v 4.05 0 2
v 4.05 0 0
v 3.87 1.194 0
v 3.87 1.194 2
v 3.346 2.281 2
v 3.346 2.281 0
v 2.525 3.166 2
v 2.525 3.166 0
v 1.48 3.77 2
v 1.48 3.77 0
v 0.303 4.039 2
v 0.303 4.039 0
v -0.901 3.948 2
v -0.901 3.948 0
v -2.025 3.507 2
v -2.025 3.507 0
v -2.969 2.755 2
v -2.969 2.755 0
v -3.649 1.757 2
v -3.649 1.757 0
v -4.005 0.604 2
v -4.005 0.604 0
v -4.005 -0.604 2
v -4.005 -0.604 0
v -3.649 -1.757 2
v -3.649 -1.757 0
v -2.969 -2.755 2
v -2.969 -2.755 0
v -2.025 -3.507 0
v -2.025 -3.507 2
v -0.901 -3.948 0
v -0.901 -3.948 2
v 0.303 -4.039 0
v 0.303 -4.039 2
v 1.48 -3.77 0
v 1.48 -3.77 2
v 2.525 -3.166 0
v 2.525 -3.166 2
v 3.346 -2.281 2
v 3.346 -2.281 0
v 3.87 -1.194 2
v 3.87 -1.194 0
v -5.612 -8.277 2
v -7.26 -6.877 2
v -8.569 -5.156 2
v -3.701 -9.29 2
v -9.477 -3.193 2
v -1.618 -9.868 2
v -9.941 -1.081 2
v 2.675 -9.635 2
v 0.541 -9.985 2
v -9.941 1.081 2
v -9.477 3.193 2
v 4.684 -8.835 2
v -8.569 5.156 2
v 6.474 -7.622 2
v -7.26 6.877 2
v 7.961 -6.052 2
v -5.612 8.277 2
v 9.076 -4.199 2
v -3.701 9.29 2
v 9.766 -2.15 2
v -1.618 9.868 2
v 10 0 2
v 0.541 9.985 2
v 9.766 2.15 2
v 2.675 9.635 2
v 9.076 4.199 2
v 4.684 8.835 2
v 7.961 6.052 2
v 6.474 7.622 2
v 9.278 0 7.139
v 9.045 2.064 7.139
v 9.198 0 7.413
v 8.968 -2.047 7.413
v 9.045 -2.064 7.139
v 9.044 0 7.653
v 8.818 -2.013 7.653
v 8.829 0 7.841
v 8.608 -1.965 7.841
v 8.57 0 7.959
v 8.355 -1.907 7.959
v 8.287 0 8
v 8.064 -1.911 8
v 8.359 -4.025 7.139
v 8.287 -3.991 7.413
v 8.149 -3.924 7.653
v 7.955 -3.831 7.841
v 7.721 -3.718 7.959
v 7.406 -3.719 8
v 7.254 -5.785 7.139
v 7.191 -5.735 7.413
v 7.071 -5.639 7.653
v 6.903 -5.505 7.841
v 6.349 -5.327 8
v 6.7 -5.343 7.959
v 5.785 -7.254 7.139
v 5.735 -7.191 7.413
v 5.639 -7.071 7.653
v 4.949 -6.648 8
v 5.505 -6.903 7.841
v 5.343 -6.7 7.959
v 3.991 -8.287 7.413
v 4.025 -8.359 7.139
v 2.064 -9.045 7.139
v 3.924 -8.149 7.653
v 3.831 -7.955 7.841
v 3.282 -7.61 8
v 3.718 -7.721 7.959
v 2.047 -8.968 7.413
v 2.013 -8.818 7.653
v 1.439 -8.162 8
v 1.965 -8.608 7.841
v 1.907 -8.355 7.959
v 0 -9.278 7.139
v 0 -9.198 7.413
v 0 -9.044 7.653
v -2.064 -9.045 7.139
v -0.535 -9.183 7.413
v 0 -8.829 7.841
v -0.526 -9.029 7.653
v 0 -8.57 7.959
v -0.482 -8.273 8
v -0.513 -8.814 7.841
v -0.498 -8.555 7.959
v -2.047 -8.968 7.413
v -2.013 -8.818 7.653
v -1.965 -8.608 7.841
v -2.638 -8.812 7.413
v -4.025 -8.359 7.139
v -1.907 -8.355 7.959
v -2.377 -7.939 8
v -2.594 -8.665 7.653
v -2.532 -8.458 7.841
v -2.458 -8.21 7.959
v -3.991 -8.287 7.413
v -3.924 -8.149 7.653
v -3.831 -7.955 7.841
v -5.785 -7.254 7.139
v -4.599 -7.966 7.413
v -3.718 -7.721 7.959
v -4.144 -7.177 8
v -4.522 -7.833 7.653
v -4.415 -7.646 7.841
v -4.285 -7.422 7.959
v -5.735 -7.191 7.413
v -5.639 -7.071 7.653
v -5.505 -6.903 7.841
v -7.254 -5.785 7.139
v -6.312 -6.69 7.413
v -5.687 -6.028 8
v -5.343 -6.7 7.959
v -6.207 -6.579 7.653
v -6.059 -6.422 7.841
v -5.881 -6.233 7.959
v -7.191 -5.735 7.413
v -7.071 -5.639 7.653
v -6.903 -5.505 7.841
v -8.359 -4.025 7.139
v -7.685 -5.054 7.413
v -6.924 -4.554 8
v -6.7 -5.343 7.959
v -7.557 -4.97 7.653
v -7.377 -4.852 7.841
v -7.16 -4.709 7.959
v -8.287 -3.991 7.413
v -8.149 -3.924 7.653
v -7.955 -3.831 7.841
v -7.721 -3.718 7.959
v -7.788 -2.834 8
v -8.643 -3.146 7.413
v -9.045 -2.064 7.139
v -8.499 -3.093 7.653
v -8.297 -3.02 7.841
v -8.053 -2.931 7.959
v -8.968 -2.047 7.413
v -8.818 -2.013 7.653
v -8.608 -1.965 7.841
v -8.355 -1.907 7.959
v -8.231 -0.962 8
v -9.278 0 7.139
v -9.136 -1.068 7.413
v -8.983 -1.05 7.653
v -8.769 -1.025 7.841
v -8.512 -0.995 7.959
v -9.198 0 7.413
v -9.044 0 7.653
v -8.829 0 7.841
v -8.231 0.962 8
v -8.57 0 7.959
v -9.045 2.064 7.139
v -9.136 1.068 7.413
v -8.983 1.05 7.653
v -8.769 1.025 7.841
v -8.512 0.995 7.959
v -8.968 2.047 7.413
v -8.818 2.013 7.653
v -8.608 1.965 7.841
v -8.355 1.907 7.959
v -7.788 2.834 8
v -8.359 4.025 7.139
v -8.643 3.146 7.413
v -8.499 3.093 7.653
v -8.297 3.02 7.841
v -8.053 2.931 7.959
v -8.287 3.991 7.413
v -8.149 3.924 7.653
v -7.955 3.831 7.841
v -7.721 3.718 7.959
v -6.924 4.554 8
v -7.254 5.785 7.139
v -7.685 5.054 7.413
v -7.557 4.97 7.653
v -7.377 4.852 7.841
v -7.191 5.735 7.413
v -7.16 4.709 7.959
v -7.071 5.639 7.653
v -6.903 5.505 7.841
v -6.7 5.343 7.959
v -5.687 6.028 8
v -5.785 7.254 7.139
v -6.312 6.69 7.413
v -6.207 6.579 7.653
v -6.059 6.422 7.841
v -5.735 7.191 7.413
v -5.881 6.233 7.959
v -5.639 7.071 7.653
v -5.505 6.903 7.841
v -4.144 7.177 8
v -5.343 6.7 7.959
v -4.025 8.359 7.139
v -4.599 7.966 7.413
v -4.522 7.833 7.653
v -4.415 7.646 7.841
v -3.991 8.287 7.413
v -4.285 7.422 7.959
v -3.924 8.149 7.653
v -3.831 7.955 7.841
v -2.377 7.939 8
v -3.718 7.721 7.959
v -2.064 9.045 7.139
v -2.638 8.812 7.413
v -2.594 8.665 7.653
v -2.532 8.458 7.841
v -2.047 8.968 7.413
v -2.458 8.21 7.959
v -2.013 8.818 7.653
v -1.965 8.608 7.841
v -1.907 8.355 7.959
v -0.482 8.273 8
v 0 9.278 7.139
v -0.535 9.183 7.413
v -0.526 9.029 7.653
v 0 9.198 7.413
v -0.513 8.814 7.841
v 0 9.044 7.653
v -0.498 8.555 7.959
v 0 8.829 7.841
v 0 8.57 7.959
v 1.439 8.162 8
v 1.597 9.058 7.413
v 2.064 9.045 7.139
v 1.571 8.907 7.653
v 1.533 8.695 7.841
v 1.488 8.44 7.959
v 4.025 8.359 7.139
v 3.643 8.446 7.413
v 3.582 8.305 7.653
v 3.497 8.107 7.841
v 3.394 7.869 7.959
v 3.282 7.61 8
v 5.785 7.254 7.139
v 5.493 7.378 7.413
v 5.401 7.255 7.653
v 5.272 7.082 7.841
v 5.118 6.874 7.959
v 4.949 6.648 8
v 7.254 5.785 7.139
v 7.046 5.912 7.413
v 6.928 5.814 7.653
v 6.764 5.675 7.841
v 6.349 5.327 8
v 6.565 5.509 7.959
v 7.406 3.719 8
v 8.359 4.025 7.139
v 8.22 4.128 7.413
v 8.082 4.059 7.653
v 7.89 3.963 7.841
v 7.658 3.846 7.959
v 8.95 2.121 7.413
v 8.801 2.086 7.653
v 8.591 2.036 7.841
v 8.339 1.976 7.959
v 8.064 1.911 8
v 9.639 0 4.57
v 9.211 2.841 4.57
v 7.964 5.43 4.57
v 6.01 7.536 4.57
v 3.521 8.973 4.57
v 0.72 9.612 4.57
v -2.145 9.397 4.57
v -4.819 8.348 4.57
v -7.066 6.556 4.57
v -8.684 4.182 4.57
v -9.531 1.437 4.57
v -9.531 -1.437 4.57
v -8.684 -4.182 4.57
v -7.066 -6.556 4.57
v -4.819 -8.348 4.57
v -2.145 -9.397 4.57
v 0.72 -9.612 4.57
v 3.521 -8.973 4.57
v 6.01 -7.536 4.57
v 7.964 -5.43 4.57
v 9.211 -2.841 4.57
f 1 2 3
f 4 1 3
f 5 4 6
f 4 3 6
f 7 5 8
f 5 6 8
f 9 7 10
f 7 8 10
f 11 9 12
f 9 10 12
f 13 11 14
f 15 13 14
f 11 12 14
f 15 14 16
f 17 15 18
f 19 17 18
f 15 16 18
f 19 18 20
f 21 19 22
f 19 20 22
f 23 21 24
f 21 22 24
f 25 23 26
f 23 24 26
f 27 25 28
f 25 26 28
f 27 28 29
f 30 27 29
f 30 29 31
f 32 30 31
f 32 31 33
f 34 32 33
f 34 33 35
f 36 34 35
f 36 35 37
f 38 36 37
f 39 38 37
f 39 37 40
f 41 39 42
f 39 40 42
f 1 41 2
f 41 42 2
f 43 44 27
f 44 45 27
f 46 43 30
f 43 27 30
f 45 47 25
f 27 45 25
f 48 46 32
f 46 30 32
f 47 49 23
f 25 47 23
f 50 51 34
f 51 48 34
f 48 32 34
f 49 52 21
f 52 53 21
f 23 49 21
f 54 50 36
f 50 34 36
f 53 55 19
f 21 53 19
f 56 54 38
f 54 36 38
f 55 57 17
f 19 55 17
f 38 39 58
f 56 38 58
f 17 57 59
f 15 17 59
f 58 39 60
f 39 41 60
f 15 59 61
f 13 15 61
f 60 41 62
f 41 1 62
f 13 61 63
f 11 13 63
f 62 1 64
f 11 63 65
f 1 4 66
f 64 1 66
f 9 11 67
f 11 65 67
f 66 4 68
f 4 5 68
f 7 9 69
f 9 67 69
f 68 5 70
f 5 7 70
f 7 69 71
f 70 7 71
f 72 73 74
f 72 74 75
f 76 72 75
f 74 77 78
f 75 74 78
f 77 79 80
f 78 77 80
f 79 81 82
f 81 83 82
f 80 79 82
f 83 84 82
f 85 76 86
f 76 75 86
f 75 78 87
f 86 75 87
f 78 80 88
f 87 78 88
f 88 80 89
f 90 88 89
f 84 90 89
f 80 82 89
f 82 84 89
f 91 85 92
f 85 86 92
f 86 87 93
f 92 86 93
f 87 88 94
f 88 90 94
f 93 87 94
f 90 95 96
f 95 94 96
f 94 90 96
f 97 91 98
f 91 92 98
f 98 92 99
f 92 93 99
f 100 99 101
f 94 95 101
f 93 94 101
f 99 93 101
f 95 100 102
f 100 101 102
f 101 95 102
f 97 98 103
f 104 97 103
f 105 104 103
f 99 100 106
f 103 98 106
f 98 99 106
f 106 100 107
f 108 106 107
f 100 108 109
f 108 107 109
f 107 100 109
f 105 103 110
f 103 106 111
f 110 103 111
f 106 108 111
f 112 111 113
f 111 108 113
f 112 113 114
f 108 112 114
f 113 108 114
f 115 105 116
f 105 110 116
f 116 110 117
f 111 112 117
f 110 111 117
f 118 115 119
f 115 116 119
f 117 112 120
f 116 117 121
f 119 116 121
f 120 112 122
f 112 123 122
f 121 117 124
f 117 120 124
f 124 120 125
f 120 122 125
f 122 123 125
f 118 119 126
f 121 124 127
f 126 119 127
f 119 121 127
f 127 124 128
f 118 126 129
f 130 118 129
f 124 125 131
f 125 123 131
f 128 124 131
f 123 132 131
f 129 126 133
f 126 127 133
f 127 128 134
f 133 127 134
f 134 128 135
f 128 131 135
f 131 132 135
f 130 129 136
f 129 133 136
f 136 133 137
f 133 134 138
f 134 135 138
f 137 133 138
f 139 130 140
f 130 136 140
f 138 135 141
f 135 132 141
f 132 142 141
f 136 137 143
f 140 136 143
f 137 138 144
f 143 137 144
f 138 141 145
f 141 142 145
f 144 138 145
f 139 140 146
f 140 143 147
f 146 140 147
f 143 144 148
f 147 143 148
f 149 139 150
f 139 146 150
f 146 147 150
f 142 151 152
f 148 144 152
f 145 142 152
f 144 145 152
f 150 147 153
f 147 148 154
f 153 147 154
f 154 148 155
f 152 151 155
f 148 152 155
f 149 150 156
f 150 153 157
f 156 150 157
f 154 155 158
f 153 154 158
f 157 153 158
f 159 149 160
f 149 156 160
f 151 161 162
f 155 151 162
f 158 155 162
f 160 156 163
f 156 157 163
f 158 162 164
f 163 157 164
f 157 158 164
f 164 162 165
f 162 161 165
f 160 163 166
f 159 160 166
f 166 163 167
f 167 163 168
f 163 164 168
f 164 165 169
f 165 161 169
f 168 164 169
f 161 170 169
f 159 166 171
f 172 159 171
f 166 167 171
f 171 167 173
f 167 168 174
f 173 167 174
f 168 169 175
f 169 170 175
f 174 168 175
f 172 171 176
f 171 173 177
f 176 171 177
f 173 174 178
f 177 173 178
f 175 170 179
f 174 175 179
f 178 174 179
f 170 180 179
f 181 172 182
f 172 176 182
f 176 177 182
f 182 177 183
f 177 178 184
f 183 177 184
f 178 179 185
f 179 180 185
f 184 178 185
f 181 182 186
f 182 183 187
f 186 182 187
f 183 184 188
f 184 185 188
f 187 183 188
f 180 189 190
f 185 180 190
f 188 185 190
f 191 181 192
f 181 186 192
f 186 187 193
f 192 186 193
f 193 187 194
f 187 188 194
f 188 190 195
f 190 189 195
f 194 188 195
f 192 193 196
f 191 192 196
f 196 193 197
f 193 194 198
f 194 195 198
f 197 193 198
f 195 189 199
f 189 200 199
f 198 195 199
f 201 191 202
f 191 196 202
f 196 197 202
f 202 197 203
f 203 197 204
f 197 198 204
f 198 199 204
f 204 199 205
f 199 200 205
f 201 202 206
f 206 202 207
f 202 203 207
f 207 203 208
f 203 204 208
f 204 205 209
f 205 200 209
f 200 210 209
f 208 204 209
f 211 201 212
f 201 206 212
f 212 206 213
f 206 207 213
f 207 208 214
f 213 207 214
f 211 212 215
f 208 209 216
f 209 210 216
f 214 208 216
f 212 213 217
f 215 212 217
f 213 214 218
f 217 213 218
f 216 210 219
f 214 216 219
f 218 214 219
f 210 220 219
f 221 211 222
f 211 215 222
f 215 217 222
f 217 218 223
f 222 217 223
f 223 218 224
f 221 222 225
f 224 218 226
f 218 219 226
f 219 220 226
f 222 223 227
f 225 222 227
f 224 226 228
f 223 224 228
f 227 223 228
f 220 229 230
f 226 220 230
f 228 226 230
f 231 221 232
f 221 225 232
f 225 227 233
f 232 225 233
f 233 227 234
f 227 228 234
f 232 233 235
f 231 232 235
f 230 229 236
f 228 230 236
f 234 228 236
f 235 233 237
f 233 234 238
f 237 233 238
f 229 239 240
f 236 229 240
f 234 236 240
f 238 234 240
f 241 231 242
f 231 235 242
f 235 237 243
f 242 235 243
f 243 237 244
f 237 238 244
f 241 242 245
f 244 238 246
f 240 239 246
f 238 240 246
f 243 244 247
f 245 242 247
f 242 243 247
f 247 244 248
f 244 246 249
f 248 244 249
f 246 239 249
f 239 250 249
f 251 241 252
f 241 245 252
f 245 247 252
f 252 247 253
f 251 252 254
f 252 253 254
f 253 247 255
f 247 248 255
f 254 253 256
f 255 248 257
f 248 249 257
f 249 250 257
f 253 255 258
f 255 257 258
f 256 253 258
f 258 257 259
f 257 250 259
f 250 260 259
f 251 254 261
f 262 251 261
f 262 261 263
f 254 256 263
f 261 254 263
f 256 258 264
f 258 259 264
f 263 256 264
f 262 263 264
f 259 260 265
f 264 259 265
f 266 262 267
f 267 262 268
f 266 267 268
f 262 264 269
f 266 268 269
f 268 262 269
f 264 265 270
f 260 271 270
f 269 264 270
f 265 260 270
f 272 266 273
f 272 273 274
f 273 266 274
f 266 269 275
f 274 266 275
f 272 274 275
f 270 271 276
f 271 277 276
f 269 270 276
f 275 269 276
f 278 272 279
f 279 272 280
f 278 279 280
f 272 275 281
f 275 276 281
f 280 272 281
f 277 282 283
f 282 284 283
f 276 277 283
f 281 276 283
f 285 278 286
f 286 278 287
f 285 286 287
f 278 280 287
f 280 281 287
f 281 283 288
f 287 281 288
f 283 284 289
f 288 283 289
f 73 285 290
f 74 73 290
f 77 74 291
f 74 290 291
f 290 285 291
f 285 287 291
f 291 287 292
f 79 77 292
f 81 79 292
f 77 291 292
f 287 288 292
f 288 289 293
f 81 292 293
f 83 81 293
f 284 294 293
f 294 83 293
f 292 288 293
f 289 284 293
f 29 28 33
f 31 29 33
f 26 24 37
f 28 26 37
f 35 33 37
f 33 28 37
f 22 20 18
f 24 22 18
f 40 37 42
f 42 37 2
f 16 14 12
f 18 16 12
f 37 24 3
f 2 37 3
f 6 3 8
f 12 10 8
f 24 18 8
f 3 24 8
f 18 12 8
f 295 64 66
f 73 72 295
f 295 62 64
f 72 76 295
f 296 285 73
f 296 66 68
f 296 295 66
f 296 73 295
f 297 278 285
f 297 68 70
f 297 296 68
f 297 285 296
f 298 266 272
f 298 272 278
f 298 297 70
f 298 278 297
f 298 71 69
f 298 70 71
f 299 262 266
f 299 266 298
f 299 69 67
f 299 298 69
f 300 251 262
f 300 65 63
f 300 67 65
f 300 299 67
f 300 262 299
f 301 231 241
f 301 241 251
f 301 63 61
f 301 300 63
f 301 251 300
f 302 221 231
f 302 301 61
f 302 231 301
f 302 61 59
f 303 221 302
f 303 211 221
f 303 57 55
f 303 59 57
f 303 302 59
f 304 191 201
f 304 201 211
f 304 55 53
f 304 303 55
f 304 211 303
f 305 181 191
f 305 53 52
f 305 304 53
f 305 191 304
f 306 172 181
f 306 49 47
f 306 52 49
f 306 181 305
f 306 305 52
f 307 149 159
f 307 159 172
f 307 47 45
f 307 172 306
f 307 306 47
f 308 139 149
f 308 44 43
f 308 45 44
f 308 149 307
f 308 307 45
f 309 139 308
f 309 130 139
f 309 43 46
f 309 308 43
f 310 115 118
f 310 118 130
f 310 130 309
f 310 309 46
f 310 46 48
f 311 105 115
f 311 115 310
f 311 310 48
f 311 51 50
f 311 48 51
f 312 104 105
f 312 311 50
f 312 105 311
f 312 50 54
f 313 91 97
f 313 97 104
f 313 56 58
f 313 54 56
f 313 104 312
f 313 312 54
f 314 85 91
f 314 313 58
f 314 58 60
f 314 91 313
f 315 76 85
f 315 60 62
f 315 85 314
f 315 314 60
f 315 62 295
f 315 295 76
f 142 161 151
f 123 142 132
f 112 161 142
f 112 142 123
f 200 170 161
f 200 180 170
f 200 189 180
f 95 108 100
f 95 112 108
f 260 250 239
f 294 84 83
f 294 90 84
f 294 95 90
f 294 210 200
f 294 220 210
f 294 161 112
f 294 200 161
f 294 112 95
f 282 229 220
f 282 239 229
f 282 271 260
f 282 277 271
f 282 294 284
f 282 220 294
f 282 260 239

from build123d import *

# Parameters (mm, degrees)
ESQUISSE1_R        = 4.05
BOSS_EXTRU_1_DEPTH = 2
ESQUISSE2_R        = 10
BOSS_EXTRU_2_DEPTH = 6
BOSS_EXTRU_2_TAPER = 8
CONG_1_R           = 1


with BuildPart() as part:
    # Esquisse1 → Boss.-Extru.1 (new body)
    with BuildSketch(Plane.XY):
        Circle(ESQUISSE1_R)
    extrude(amount=BOSS_EXTRU_1_DEPTH)

    # Esquisse2 → Boss.-Extru.2 (add)
    with BuildSketch(Plane.XY.offset(2)):
        Circle(ESQUISSE2_R)
    extrude(amount=BOSS_EXTRU_2_DEPTH, taper=BOSS_EXTRU_2_TAPER)

    # Congé1
    cong_1_edges = [part.edges().sort_by_distance(p)[0] for p in [
        (-9.156754992, 0, 8),
    ]]
    fillet(cong_1_edges, radius=CONG_1_R)


solid = part.part
